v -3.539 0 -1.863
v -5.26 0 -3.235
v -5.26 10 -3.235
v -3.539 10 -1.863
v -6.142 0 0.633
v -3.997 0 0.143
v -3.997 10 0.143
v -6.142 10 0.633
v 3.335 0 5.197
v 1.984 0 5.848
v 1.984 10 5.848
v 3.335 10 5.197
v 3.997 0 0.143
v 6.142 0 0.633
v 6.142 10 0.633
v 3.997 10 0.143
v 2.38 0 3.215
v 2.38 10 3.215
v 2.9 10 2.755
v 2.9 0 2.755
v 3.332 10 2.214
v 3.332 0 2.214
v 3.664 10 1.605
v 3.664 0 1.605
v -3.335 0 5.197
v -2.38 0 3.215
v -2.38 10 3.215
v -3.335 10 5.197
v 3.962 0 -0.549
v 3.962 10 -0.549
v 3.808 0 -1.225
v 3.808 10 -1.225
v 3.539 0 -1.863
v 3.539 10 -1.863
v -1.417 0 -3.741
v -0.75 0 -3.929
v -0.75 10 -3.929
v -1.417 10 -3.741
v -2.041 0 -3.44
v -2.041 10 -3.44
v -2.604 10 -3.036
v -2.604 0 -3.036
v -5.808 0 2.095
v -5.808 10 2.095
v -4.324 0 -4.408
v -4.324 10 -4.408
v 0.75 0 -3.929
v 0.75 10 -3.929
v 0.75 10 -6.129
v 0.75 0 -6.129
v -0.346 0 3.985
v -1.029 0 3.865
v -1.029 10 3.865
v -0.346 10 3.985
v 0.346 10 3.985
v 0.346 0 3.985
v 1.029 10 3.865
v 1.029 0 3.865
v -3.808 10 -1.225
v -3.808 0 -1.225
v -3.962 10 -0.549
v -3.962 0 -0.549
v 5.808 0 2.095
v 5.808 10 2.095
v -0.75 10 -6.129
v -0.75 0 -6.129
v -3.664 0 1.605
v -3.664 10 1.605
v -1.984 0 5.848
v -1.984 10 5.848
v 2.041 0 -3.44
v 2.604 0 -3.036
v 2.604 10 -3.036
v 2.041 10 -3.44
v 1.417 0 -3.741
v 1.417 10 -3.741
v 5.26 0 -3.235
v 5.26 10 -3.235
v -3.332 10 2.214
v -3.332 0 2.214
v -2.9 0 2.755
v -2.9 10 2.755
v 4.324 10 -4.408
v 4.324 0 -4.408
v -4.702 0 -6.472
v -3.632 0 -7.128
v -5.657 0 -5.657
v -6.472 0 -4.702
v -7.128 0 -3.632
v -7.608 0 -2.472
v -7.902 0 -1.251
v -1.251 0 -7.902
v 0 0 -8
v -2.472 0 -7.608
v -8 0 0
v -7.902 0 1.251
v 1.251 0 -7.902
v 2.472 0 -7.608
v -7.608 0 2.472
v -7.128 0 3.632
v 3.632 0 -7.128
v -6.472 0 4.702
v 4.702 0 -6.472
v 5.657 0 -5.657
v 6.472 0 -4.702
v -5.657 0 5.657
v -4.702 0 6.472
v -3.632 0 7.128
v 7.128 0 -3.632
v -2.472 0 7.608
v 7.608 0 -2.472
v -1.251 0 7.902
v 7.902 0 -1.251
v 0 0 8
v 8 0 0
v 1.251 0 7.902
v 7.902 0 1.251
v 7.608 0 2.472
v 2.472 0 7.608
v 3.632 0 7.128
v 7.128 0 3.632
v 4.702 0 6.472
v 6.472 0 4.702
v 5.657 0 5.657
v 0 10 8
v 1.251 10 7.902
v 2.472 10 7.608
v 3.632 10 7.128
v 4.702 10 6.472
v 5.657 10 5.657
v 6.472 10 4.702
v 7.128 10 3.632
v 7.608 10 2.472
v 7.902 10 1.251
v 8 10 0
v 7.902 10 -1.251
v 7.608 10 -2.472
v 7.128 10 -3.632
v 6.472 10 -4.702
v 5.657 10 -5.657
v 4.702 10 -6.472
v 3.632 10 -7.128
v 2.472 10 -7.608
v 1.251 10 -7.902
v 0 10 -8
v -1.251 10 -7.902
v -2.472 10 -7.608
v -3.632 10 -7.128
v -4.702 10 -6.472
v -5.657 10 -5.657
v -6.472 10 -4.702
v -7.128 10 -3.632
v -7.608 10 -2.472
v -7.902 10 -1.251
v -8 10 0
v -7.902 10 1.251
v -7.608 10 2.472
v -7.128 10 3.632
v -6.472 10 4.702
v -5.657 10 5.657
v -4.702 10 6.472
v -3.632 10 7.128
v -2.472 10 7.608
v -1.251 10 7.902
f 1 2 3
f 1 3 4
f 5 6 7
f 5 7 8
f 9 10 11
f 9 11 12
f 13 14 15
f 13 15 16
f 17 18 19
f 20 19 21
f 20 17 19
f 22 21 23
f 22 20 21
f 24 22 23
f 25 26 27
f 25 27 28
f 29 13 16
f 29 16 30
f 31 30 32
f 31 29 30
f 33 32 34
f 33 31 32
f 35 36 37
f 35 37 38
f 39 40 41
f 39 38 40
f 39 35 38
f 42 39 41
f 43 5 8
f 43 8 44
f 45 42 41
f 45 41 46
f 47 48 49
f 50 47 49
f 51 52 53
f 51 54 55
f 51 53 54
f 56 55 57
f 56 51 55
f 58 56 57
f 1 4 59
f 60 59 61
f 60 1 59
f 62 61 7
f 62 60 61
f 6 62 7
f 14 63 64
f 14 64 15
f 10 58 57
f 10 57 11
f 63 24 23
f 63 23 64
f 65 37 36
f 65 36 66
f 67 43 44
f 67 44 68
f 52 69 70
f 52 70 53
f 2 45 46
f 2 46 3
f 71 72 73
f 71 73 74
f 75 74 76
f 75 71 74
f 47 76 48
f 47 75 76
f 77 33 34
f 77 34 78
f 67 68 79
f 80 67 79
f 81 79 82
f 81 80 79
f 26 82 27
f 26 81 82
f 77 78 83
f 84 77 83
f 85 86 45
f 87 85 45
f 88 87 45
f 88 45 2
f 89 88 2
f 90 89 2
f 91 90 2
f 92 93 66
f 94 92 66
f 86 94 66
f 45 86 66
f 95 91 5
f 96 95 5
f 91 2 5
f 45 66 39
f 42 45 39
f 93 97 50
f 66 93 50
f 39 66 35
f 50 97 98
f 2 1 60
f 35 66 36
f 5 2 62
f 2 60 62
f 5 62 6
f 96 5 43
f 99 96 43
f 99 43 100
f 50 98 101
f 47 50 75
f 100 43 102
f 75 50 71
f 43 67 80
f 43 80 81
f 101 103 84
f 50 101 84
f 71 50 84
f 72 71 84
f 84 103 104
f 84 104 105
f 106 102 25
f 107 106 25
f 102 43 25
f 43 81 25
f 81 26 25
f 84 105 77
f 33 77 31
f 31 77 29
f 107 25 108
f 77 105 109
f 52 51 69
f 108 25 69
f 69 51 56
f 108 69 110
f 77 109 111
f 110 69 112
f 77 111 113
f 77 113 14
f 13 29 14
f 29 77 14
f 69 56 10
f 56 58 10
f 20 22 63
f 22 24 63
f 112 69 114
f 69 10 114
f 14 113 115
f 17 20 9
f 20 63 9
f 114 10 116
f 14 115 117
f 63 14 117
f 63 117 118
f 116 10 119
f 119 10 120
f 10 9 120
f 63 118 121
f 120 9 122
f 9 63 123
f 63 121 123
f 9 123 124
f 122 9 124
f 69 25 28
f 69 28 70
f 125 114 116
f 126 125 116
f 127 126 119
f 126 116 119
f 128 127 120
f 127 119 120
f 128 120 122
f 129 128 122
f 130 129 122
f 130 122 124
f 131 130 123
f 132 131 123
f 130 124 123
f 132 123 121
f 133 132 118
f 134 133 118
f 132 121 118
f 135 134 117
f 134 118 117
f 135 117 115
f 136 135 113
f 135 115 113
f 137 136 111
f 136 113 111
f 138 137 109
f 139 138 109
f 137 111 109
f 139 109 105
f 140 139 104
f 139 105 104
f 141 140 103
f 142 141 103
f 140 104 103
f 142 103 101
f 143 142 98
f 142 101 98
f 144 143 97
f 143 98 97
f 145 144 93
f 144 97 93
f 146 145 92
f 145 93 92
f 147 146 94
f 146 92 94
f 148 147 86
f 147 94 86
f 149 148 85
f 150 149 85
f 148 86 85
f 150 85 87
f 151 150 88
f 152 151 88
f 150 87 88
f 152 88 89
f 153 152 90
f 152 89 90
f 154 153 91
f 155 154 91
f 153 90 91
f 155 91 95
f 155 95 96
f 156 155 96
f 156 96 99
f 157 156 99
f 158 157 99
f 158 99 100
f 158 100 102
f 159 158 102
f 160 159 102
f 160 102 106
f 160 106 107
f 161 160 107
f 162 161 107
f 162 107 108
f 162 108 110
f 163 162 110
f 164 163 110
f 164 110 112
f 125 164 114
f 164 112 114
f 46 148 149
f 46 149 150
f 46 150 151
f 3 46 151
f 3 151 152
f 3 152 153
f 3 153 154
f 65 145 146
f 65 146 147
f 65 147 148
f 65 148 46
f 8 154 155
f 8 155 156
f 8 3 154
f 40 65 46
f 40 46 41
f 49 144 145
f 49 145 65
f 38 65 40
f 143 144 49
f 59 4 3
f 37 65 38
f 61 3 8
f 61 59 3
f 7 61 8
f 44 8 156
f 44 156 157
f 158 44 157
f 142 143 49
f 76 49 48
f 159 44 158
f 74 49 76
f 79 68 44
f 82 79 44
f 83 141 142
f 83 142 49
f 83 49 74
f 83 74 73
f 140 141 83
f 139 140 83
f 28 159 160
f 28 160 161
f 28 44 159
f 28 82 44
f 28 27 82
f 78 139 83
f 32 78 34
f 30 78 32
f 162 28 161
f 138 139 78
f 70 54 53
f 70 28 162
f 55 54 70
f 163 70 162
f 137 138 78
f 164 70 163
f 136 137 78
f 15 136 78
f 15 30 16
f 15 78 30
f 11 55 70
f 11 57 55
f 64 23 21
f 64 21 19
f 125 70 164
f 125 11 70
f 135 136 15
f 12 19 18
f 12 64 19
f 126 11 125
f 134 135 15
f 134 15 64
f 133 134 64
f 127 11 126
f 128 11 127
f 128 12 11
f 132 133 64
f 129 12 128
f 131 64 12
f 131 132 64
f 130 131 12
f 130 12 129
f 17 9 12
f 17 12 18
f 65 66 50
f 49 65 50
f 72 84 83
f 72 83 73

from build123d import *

# Parameters (mm, degrees)
CASING_R            = 8
CASING_R_2          = 4
BOSS_EXTRUDE1_DEPTH = 10
CUT_EXTRUDE1_REACH  = 17.1
NOTCH_W             = 1.5
NOTCH_H             = 2.2


with BuildPart() as part:
    # Casing → Boss-Extrude1 (new body)
    with BuildSketch(Plane(origin=(0, 0, 0), x_dir=(1, 0, 0), z_dir=(0, 1, 0))):
        with Locations(Location((0, 0, 0), (0, 0, 270))):
            Circle(CASING_R)
        with Locations(Location((0, 0, 0), (0, 0, 270))):
            Circle(CASING_R_2, mode=Mode.SUBTRACT)
    extrude(amount=BOSS_EXTRUDE1_DEPTH)

    # Notch → Cut-Extrude1 (cut, up to next)
    with BuildSketch(Plane(origin=(0, 0, 0), x_dir=(1, 0, 0), z_dir=(0, 1, 0)), mode=Mode.PRIVATE) as cut_extrude1_sk1:
        with Locations((0, 5.029058411)):
            Rectangle(NOTCH_W, NOTCH_H)
    cut_extrude1_tool1 = extrude(cut_extrude1_sk1.sketch, amount=CUT_EXTRUDE1_REACH, mode=Mode.PRIVATE) & part.part
    # Notch → Cut-Extrude1 (cut, up to next)
    with BuildSketch(Plane(origin=(0, 0, 0), x_dir=(1, 0, 0), z_dir=(0, 1, 0)), mode=Mode.PRIVATE) as cut_extrude1_sk2:
        Polygon((-2.604244211, 3.036101462), (-4.324273473, 4.407779026), (-5.259508175, 3.235031803), (-3.539478914, 1.863354239), align=None)
    cut_extrude1_tool2 = extrude(cut_extrude1_sk2.sketch, amount=CUT_EXTRUDE1_REACH, mode=Mode.PRIVATE) & part.part
    # Notch → Cut-Extrude1 (cut, up to next)
    with BuildSketch(Plane(origin=(0, 0, 0), x_dir=(1, 0, 0), z_dir=(0, 1, 0)), mode=Mode.PRIVATE) as cut_extrude1_sk3:
        Polygon((-3.997439414, -0.143101813), (-6.142280821, -0.632647868), (-5.80849942, -2.095039736), (-3.663658013, -1.605493681), align=None)
    cut_extrude1_tool3 = extrude(cut_extrude1_sk3.sketch, amount=CUT_EXTRUDE1_REACH, mode=Mode.PRIVATE) & part.part
    # Notch → Cut-Extrude1 (cut, up to next)
    with BuildSketch(Plane(origin=(0, 0, 0), x_dir=(1, 0, 0), z_dir=(0, 1, 0)), mode=Mode.PRIVATE) as cut_extrude1_sk4:
        Polygon((-2.380481206, -3.214546504), (-3.335025432, -5.196678014), (-1.98357213, -5.847503623), (-1.029027904, -3.865372113), align=None)
    cut_extrude1_tool4 = extrude(cut_extrude1_sk4.sketch, amount=CUT_EXTRUDE1_REACH, mode=Mode.PRIVATE) & part.part
    # Notch → Cut-Extrude1 (cut, up to next)
    with BuildSketch(Plane(origin=(0, 0, 0), x_dir=(1, 0, 0), z_dir=(0, 1, 0)), mode=Mode.PRIVATE) as cut_extrude1_sk5:
        Polygon((1.029027904, -3.865372113), (1.98357213, -5.847503623), (3.335025432, -5.196678014), (2.380481206, -3.214546504), align=None)
    cut_extrude1_tool5 = extrude(cut_extrude1_sk5.sketch, amount=CUT_EXTRUDE1_REACH, mode=Mode.PRIVATE) & part.part
    # Notch → Cut-Extrude1 (cut, up to next)
    with BuildSketch(Plane(origin=(0, 0, 0), x_dir=(1, 0, 0), z_dir=(0, 1, 0)), mode=Mode.PRIVATE) as cut_extrude1_sk6:
        Polygon((3.663658013, -1.605493681), (5.80849942, -2.095039736), (6.142280821, -0.632647868), (3.997439414, -0.143101813), align=None)
    cut_extrude1_tool6 = extrude(cut_extrude1_sk6.sketch, amount=CUT_EXTRUDE1_REACH, mode=Mode.PRIVATE) & part.part
    # Notch → Cut-Extrude1 (cut, up to next)
    with BuildSketch(Plane(origin=(0, 0, 0), x_dir=(1, 0, 0), z_dir=(0, 1, 0)), mode=Mode.PRIVATE) as cut_extrude1_sk7:
        Polygon((3.539478914, 1.863354239), (5.259508175, 3.235031803), (4.324273473, 4.407779026), (2.604244211, 3.036101462), align=None)
    cut_extrude1_tool7 = extrude(cut_extrude1_sk7.sketch, amount=CUT_EXTRUDE1_REACH, mode=Mode.PRIVATE) & part.part
    add(cut_extrude1_tool1.solids().sort_by_distance((0, 0, -5.029058))[0], mode=Mode.SUBTRACT)
    add(cut_extrude1_tool2.solids().sort_by_distance((-3.931876, 0, -3.135567))[0], mode=Mode.SUBTRACT)
    add(cut_extrude1_tool3.solids().sort_by_distance((-4.902969, 0, 1.119071))[0], mode=Mode.SUBTRACT)
    add(cut_extrude1_tool4.solids().sort_by_distance((-2.182027, 0, 4.531025))[0], mode=Mode.SUBTRACT)
    add(cut_extrude1_tool5.solids().sort_by_distance((2.182027, 0, 4.531025))[0], mode=Mode.SUBTRACT)
    add(cut_extrude1_tool6.solids().sort_by_distance((4.902969, 0, 1.119071))[0], mode=Mode.SUBTRACT)
    add(cut_extrude1_tool7.solids().sort_by_distance((3.931876, 0, -3.135567))[0], mode=Mode.SUBTRACT)


solid = part.part
